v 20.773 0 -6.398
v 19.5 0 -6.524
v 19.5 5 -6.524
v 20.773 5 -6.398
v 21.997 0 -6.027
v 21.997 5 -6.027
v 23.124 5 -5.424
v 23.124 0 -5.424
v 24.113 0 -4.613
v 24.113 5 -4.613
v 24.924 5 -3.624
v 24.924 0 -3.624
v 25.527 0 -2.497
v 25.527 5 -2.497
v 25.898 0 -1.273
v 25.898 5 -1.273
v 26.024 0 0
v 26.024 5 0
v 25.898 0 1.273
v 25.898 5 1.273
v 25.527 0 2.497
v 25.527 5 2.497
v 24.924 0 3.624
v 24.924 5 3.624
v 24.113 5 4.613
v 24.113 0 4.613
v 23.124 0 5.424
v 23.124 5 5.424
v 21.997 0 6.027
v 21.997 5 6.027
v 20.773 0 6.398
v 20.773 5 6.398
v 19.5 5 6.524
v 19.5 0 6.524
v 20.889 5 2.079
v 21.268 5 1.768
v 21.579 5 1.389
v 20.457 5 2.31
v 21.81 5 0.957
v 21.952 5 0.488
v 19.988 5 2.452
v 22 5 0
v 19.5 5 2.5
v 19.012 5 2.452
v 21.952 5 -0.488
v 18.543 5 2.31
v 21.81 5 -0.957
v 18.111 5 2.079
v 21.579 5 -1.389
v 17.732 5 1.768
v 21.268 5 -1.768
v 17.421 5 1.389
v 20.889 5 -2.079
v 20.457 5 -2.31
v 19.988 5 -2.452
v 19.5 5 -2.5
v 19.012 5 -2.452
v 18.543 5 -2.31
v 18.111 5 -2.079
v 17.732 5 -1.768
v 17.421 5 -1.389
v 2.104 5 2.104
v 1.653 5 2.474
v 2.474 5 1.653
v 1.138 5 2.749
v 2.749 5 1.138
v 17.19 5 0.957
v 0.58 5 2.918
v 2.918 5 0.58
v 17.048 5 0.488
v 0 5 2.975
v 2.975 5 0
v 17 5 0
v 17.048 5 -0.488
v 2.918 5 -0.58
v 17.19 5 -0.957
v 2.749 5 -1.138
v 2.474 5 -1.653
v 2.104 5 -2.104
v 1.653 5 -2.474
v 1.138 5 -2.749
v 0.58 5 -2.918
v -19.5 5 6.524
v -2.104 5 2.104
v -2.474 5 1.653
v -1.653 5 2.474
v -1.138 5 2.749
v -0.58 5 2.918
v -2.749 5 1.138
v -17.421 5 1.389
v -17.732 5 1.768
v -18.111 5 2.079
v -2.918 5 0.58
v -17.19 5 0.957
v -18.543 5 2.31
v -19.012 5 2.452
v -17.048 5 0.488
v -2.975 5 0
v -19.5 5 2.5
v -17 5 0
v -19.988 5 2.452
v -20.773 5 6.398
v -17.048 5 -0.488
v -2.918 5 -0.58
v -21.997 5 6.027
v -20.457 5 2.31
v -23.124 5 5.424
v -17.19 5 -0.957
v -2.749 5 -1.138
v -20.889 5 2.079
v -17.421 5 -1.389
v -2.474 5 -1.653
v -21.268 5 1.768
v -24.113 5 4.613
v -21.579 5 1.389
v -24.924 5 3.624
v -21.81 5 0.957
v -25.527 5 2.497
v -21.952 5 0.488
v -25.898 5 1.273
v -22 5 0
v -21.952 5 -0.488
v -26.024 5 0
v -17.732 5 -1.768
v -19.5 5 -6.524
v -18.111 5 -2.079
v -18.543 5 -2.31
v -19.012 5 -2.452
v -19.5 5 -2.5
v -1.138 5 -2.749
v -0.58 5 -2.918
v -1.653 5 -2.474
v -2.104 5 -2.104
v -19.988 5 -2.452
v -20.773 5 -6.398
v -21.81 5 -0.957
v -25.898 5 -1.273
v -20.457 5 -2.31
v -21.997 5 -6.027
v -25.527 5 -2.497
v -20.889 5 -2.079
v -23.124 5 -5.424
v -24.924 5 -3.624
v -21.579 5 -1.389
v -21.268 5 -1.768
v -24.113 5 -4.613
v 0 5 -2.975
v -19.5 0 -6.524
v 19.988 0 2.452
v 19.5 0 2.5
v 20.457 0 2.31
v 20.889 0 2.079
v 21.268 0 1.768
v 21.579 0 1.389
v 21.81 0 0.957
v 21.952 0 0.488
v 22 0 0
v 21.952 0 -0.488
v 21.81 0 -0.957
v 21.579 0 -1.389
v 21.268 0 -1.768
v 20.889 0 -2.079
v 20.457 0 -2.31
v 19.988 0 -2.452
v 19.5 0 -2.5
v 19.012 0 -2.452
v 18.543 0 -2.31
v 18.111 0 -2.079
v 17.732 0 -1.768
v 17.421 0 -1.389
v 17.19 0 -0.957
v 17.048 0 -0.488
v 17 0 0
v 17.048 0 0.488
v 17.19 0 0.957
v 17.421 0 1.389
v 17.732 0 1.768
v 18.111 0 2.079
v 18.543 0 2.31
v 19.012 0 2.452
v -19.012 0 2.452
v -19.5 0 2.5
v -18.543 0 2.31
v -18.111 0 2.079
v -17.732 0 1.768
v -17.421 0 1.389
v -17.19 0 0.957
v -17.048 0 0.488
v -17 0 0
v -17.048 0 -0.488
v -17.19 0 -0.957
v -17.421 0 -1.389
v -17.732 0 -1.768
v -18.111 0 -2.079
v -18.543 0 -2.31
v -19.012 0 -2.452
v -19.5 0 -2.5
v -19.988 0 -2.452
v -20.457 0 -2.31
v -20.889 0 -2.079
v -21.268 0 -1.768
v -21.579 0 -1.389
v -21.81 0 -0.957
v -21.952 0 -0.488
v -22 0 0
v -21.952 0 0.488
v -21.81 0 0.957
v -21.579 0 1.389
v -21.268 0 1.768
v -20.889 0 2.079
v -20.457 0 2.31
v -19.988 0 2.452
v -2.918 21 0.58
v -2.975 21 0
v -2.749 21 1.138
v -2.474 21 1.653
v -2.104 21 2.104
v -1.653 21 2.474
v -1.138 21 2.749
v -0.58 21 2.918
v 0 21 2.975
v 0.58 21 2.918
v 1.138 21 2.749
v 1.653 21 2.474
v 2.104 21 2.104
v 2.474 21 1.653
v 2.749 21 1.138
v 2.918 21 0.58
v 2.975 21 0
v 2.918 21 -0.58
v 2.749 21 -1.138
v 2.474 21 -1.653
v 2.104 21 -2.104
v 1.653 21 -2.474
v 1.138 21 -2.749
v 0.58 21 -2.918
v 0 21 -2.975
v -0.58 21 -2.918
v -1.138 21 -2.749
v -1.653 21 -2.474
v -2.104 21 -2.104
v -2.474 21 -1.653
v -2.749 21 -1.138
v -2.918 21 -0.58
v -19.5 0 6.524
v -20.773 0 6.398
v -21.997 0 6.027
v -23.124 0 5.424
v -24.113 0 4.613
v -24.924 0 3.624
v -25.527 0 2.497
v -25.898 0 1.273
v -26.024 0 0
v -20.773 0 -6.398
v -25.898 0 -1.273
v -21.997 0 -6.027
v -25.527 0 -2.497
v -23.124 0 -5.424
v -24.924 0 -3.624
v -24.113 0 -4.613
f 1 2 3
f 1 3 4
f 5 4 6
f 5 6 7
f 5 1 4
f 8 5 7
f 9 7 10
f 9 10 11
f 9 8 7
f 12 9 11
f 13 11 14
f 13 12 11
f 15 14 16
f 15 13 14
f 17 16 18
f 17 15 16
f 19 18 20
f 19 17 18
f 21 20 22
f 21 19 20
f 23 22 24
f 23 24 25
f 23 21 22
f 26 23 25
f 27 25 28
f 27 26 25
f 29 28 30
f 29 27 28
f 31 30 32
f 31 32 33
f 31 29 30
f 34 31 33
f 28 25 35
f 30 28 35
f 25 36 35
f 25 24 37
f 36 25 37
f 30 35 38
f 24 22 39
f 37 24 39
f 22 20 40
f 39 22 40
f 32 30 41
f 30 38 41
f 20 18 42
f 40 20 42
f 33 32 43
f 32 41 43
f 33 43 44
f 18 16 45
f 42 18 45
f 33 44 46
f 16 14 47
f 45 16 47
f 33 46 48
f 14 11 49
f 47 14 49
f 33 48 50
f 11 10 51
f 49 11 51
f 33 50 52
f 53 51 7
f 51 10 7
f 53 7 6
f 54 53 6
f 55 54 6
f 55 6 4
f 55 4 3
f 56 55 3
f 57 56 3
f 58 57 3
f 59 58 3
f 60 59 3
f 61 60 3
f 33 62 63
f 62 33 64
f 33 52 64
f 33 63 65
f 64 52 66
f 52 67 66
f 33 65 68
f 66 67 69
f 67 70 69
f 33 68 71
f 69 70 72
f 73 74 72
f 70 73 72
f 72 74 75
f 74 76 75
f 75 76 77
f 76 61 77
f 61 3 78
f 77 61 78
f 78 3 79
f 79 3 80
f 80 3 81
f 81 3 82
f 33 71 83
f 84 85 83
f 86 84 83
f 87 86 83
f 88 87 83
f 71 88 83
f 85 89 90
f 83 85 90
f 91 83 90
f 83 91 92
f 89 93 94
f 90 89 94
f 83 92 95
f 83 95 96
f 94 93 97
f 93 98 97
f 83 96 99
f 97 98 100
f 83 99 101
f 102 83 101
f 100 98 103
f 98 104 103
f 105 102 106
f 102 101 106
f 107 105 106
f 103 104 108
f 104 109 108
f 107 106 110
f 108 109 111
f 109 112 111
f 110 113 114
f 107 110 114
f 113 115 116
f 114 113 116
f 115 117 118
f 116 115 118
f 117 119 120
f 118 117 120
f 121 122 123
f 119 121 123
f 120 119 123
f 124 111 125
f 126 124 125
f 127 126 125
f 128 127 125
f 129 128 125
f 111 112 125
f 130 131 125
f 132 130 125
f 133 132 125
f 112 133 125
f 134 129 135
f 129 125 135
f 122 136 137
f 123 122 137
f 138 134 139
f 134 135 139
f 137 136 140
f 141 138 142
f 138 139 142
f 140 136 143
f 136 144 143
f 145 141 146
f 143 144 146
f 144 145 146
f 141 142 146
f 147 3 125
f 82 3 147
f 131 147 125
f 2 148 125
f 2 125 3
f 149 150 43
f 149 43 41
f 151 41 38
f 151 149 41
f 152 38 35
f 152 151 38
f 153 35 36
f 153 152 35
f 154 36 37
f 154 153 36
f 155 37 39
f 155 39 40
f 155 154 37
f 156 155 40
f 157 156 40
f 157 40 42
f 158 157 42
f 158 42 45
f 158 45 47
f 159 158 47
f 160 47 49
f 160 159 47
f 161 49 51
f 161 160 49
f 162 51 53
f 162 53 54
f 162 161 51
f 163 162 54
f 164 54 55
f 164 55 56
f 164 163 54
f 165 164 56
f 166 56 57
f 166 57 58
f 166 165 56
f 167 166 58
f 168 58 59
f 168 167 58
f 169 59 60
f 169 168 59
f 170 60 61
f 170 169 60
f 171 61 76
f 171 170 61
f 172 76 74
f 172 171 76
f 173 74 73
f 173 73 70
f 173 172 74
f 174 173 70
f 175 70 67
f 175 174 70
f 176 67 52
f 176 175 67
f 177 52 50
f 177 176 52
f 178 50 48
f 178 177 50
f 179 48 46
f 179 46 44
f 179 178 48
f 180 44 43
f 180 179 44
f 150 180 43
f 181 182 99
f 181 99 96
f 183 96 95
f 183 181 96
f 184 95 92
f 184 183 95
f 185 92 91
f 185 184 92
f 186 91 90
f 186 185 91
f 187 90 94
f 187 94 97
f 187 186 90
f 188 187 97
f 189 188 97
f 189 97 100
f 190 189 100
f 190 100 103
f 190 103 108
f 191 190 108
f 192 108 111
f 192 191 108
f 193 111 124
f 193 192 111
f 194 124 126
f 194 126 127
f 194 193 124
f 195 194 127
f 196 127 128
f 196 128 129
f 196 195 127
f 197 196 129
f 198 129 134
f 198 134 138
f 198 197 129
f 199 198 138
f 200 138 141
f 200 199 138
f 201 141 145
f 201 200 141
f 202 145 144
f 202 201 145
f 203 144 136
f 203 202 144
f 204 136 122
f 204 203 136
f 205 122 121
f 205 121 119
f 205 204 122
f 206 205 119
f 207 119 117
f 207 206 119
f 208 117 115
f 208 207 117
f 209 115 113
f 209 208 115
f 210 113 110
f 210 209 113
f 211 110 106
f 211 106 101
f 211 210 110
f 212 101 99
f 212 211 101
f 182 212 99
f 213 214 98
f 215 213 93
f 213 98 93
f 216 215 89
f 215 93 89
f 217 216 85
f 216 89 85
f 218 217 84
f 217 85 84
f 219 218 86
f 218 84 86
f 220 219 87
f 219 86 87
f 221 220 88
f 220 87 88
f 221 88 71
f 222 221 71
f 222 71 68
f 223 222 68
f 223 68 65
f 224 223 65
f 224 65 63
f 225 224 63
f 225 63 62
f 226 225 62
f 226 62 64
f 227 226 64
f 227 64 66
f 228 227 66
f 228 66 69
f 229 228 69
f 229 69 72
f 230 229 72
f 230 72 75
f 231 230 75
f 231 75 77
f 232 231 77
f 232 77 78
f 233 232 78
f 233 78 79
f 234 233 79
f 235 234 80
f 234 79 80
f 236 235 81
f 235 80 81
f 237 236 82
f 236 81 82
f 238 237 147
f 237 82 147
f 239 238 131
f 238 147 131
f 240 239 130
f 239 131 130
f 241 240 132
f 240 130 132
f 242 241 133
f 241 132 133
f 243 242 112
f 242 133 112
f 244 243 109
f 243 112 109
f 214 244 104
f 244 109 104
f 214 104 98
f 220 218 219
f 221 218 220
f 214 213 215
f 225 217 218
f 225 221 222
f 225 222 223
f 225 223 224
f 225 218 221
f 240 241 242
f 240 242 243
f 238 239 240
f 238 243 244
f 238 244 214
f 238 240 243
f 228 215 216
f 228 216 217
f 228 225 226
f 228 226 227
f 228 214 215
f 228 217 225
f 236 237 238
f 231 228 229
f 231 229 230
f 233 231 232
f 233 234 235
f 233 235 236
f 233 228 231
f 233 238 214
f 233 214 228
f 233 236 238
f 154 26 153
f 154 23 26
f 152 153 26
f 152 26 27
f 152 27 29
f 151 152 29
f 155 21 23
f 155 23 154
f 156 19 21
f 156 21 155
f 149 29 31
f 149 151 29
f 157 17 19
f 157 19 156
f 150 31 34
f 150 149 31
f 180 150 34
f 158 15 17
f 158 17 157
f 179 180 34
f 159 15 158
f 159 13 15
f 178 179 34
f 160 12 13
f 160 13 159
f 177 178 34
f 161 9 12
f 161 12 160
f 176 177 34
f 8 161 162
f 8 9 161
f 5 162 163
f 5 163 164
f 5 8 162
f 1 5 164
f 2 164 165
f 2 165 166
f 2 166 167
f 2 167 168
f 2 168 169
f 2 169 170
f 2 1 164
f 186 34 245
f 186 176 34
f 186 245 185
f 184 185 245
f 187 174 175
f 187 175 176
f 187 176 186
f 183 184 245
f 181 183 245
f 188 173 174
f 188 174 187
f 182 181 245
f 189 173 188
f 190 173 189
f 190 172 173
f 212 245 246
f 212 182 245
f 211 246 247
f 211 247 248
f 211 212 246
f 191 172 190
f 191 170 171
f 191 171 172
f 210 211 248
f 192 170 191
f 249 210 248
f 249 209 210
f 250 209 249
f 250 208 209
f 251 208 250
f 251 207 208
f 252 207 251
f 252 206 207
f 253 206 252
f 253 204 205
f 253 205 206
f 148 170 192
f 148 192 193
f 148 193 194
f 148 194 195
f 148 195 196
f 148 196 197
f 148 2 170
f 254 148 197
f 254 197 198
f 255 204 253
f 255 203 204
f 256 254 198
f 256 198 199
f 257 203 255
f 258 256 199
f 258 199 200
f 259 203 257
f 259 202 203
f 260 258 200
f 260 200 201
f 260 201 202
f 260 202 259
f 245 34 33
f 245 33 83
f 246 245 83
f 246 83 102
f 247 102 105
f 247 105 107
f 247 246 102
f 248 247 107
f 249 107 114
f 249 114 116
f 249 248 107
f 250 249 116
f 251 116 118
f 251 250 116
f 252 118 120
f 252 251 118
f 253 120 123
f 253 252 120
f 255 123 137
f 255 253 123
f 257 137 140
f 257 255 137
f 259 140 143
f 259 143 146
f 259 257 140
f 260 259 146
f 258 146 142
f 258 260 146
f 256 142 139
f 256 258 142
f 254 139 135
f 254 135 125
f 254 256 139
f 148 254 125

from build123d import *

# Parameters (mm, degrees)
CROQUIS2_R              = 2.5
SALIENTE_EXTRUIR1_DEPTH = 5
CROQUIS2_4_R            = 2.975
SALIENTE_EXTRUIR2_DEPTH = 21


with BuildPart() as part:
    # Croquis2 → Saliente-Extruir1 (new body)
    with BuildSketch(Plane(origin=(0, 0, 0), x_dir=(1, 0, 0), z_dir=(0, 1, 0))):
        with BuildLine():
            Line((19.5, 6.523737612), (-19.5, 6.523737612))
            ThreePointArc((-19.5, 6.523737612), (-26.023737612, 0), (-19.5, -6.523737612))
            Line((-19.5, -6.523737612), (19.5, -6.523737612))
            ThreePointArc((19.5, -6.523737612), (26.023737612, 0), (19.5, 6.523737612))
        make_face()
        with Locations((-19.5, 0)):
            Circle(CROQUIS2_R, mode=Mode.SUBTRACT)
        with BuildLine():
            ThreePointArc((2.975, 0), (0, -2.975), (-2.975, 0))
            ThreePointArc((-2.975, 0), (0, 2.975), (2.975, 0))
        make_face(mode=Mode.SUBTRACT)
        with BuildLine():
            ThreePointArc((22, 0), (19.5, -2.5), (17, 0))
            ThreePointArc((17, 0), (19.5, 2.5), (22, 0))
        make_face(mode=Mode.SUBTRACT)
    extrude(amount=SALIENTE_EXTRUIR1_DEPTH)

    # Croquis2<4> → Saliente-Extruir2 (add)
    with BuildSketch(Plane(origin=(0, 0, 0), x_dir=(1, 0, 0), z_dir=(0, 1, 0))):
        Circle(CROQUIS2_4_R)
    extrude(amount=SALIENTE_EXTRUIR2_DEPTH)


solid = part.part
